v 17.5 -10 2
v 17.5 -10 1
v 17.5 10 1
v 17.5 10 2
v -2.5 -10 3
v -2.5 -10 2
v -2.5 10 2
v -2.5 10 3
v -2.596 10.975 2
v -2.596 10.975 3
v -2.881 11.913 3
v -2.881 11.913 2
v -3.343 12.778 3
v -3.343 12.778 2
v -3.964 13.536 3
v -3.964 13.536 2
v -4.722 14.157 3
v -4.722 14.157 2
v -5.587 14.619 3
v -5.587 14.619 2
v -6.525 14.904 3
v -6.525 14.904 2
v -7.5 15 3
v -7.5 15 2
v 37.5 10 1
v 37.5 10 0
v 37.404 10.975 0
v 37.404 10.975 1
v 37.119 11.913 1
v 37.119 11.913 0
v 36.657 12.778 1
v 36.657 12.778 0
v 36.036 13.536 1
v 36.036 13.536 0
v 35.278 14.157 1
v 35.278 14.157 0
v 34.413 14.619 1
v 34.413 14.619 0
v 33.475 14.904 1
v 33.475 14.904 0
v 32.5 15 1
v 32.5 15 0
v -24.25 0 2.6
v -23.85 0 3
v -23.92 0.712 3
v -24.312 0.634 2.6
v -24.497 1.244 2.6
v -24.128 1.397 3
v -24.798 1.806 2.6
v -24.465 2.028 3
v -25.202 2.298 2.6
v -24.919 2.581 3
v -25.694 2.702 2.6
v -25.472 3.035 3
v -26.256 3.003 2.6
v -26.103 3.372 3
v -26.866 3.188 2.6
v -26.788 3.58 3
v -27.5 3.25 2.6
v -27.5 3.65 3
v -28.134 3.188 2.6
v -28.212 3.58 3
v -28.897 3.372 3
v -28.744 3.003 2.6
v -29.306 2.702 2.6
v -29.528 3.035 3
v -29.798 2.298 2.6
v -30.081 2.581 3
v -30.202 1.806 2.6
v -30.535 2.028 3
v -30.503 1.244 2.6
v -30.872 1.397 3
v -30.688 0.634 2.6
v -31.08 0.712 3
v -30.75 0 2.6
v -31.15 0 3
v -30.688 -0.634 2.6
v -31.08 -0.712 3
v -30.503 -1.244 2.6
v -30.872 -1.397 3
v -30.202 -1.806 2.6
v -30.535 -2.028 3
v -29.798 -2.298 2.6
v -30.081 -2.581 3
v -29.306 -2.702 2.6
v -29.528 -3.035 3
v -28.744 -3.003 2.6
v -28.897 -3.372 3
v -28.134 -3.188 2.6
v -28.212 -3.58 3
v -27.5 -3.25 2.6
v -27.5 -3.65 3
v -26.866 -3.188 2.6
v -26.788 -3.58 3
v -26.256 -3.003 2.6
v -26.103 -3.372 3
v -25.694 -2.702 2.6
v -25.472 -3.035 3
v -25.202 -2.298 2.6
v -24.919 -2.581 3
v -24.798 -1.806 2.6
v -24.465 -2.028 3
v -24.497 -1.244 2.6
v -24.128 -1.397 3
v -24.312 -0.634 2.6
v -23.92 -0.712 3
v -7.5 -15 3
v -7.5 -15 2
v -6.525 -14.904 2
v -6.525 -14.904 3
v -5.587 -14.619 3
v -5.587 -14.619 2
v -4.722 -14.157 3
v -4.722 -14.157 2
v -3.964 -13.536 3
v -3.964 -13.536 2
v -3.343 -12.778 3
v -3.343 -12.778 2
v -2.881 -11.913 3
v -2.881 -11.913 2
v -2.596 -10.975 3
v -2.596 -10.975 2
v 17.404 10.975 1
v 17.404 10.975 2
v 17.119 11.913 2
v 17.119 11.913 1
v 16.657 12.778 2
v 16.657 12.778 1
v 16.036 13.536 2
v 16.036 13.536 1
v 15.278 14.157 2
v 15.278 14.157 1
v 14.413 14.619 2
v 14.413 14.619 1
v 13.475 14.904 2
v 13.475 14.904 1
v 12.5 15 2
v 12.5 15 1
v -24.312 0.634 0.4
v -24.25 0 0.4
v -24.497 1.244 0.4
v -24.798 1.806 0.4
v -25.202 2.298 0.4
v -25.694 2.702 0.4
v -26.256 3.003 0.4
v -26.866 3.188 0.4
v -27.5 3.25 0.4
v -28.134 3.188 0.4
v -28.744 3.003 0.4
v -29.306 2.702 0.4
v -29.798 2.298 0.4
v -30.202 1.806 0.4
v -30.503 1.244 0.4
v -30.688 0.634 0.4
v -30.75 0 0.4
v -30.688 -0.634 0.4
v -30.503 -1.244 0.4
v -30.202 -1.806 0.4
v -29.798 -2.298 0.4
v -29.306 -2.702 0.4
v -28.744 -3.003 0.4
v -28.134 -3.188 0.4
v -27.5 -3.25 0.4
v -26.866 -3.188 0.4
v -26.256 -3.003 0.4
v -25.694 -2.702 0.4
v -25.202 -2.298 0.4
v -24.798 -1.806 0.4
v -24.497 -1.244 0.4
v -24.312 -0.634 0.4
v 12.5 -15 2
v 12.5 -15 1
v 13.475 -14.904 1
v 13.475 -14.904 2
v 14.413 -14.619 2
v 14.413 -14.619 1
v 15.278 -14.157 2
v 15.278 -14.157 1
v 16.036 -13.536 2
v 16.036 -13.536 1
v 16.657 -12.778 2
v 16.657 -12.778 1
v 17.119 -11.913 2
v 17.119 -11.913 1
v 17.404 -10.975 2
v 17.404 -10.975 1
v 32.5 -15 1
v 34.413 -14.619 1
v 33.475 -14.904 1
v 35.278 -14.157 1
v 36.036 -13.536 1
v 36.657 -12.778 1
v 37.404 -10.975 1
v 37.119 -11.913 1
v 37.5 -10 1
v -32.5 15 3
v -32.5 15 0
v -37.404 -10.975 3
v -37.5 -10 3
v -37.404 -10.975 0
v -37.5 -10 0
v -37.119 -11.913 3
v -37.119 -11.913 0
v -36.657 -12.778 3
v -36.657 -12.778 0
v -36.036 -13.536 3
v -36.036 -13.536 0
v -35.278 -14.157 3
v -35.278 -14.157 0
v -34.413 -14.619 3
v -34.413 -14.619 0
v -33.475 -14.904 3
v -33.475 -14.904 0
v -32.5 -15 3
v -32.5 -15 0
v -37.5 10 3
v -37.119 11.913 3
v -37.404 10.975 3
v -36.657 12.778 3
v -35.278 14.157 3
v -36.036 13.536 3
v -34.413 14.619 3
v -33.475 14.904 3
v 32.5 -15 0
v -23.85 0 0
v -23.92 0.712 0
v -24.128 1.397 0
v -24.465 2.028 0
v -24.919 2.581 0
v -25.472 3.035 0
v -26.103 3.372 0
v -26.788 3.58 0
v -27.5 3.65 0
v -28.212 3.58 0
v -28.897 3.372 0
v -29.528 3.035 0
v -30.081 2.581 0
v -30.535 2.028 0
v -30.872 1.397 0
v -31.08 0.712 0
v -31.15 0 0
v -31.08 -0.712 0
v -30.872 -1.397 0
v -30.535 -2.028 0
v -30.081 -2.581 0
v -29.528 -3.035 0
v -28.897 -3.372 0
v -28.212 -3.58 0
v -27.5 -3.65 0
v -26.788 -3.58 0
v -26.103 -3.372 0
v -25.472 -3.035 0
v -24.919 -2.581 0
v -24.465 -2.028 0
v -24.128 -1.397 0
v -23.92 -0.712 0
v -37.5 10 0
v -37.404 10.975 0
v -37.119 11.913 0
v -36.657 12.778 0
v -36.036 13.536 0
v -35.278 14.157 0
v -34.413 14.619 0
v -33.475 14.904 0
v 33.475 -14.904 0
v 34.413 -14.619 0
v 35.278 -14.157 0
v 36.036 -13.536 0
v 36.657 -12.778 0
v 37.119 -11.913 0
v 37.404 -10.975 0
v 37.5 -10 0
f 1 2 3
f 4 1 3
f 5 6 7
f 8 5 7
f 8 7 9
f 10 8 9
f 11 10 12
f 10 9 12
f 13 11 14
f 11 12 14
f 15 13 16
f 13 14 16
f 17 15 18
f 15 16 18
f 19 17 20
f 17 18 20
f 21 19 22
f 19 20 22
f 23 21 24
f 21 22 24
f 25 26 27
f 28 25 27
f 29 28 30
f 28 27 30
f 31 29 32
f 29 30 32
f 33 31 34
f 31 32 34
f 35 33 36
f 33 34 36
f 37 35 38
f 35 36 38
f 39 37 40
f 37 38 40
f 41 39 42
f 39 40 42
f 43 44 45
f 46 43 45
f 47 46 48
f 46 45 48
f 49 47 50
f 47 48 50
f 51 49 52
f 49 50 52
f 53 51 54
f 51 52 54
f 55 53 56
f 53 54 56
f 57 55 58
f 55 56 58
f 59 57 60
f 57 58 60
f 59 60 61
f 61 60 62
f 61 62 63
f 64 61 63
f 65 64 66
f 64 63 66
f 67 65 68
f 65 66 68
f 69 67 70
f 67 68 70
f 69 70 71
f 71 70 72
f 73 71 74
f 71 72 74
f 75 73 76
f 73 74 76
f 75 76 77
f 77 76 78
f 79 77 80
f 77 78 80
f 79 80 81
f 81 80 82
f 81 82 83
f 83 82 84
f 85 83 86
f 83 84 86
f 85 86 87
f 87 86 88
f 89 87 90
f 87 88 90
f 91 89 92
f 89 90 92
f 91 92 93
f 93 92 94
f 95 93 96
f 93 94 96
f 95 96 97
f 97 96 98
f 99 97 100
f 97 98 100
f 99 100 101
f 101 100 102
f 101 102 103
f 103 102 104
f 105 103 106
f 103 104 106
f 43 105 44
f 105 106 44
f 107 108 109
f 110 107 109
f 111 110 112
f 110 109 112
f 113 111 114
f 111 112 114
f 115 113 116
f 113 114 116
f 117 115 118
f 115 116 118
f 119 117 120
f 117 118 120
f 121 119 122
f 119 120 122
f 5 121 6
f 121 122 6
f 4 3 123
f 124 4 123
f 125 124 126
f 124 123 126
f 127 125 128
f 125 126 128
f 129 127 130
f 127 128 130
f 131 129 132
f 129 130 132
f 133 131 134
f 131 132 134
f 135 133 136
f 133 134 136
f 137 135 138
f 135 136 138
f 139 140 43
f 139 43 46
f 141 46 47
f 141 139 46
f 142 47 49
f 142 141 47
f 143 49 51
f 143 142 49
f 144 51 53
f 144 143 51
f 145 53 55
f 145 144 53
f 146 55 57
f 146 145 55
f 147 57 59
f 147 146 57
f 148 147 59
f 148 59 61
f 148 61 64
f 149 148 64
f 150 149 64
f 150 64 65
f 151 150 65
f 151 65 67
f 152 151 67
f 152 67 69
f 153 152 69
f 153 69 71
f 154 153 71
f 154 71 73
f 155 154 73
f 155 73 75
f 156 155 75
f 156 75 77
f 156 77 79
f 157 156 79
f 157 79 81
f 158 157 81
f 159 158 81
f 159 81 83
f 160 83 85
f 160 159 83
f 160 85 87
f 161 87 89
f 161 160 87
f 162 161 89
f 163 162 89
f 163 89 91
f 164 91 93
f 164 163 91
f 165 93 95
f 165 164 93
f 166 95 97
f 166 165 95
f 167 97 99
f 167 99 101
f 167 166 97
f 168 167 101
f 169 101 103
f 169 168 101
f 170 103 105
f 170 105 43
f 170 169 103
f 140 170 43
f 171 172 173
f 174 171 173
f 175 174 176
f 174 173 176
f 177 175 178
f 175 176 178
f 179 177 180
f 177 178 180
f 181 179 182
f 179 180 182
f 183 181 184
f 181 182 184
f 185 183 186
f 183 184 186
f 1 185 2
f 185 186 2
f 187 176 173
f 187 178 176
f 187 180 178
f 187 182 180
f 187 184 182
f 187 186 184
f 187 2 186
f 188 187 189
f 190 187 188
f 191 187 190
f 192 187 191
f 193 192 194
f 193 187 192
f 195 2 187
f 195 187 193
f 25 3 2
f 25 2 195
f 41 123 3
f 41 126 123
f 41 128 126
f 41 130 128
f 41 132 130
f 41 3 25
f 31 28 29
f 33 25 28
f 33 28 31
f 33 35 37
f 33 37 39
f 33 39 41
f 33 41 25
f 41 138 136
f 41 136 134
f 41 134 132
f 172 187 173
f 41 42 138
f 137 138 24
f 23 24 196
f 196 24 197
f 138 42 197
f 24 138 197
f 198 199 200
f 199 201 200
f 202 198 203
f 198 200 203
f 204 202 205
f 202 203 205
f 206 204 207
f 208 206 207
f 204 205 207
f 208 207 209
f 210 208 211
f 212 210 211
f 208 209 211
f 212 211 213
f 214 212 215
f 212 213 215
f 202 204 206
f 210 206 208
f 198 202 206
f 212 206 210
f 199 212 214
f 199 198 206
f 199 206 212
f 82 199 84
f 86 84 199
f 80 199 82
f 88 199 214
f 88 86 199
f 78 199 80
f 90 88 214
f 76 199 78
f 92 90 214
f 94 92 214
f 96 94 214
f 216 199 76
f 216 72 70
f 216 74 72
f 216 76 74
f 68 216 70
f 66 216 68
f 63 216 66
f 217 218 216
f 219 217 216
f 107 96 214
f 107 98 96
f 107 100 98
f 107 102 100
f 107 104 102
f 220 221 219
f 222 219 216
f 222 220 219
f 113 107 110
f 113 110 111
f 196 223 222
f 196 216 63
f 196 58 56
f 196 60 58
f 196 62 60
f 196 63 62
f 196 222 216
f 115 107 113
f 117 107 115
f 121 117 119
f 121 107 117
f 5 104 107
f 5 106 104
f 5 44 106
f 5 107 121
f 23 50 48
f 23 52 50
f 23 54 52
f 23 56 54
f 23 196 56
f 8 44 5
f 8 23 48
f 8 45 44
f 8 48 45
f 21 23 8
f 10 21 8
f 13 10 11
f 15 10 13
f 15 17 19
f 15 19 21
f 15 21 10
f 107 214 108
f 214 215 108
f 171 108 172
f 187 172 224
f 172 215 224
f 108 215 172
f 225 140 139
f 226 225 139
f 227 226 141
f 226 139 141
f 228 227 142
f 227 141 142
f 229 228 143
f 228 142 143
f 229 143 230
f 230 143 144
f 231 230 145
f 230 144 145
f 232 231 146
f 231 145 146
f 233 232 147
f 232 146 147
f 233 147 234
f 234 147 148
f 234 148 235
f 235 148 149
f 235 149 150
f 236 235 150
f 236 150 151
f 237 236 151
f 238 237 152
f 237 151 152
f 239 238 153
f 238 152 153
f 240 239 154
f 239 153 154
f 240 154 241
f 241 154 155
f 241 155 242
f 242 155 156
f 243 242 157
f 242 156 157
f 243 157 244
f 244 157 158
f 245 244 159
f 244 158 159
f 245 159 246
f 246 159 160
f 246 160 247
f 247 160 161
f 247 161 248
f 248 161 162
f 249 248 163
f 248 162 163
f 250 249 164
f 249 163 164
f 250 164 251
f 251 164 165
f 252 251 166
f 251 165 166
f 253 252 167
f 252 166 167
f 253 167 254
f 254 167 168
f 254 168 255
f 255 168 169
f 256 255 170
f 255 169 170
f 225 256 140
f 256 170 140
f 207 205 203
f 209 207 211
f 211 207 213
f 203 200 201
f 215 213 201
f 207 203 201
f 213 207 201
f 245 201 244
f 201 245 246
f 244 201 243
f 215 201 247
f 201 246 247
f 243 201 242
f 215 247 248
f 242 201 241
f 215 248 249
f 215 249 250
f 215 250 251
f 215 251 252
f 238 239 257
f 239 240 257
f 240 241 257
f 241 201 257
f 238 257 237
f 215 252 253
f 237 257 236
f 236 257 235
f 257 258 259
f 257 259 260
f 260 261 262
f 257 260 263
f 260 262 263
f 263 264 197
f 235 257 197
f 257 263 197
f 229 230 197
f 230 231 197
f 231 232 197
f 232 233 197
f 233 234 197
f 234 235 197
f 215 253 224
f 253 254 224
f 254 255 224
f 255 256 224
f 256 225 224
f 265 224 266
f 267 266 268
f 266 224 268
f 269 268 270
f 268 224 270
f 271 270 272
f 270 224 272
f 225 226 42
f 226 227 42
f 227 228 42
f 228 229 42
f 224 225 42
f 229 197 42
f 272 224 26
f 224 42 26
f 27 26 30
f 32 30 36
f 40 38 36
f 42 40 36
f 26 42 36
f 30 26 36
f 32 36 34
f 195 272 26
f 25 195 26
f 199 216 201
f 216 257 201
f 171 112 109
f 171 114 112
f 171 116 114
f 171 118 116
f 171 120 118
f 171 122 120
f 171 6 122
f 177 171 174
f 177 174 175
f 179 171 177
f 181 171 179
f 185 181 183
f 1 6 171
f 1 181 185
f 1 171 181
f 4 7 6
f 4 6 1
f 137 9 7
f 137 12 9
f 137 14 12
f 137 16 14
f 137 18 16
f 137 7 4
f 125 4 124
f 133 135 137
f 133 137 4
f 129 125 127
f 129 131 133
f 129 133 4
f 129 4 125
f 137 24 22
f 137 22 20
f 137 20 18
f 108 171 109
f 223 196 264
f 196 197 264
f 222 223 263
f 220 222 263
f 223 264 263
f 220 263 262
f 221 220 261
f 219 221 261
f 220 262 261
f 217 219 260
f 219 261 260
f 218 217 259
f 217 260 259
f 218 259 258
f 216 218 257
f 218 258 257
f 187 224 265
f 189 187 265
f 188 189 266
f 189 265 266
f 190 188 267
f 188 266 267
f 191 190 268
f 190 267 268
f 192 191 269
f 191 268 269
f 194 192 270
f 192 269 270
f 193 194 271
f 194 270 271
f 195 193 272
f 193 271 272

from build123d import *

# Parameters (mm, degrees)
F0_R     = 3.25
F1_DEPTH = 1
F2_R     = 3.25
F3_DEPTH = 1
F4_R     = 3.25
F5_DEPTH = 1
F6_SIZE  = 0.4


with BuildPart() as f1:
    # F0 (on Top) → F1 (new body)
    with BuildSketch(Plane.XY):
        with BuildLine():
            Line((32.5, 15), (-32.5, 15))
            ThreePointArc((-32.5, 15), (-36.035534, 13.535534), (-37.5, 10))
            Line((-37.5, 10), (-37.5, -10))
            ThreePointArc((-37.5, -10), (-36.035534, -13.535534), (-32.5, -15))
            Line((-32.5, -15), (32.5, -15))
            ThreePointArc((32.5, -15), (36.035534, -13.535534), (37.5, -10))
            Line((37.5, -10), (37.5, 10))
            ThreePointArc((37.5, 10), (36.035534, 13.535534), (32.5, 15))
        make_face()
        with Locations((-27.5, 0)):
            Circle(F0_R, mode=Mode.SUBTRACT)
    extrude(amount=F1_DEPTH)

    # F2 (on face) → F3 (join)
    with BuildSketch(Plane.XY.offset(1)):
        with BuildLine():
            Line((12.5, 15), (-32.5, 15))
            ThreePointArc((-32.5, 15), (-36.035534, 13.535534), (-37.5, 10))
            Line((-37.5, 10), (-37.5, -10))
            ThreePointArc((-37.5, -10), (-36.035534, -13.535534), (-32.5, -15))
            Line((-32.5, -15), (12.5, -15))
            ThreePointArc((12.5, -15), (16.035534, -13.535534), (17.5, -10))
            Line((17.5, -10), (17.5, 10))
            ThreePointArc((17.5, 10), (16.035534, 13.535534), (12.5, 15))
        make_face()
        with Locations((-27.5, 0)):
            Circle(F2_R, mode=Mode.SUBTRACT)
    extrude(amount=F3_DEPTH)

    # F4 (on face) → F5 (join)
    with BuildSketch(Plane.XY.offset(2)):
        with BuildLine():
            Line((-7.5, 15), (-32.5, 15))
            ThreePointArc((-32.5, 15), (-36.035534, 13.535534), (-37.5, 10))
            Line((-37.5, 10), (-37.5, -10))
            ThreePointArc((-37.5, -10), (-36.035534, -13.535534), (-32.5, -15))
            Line((-32.5, -15), (-7.5, -15))
            ThreePointArc((-7.5, -15), (-3.964466, -13.535534), (-2.5, -10))
            Line((-2.5, -10), (-2.5, 10))
            ThreePointArc((-2.5, 10), (-3.964466, 13.535534), (-7.5, 15))
        make_face()
        with Locations((-27.5, 0)):
            Circle(F4_R, mode=Mode.SUBTRACT)
    extrude(amount=F5_DEPTH)

    # F6
    f6_edges = [f1.edges().sort_by_distance(p)[0] for p in [
        (-30.75, 0, 3),
        (-30.75, 0, 0),
    ]]
    chamfer(f6_edges, length=F6_SIZE)


solid = f1.part
